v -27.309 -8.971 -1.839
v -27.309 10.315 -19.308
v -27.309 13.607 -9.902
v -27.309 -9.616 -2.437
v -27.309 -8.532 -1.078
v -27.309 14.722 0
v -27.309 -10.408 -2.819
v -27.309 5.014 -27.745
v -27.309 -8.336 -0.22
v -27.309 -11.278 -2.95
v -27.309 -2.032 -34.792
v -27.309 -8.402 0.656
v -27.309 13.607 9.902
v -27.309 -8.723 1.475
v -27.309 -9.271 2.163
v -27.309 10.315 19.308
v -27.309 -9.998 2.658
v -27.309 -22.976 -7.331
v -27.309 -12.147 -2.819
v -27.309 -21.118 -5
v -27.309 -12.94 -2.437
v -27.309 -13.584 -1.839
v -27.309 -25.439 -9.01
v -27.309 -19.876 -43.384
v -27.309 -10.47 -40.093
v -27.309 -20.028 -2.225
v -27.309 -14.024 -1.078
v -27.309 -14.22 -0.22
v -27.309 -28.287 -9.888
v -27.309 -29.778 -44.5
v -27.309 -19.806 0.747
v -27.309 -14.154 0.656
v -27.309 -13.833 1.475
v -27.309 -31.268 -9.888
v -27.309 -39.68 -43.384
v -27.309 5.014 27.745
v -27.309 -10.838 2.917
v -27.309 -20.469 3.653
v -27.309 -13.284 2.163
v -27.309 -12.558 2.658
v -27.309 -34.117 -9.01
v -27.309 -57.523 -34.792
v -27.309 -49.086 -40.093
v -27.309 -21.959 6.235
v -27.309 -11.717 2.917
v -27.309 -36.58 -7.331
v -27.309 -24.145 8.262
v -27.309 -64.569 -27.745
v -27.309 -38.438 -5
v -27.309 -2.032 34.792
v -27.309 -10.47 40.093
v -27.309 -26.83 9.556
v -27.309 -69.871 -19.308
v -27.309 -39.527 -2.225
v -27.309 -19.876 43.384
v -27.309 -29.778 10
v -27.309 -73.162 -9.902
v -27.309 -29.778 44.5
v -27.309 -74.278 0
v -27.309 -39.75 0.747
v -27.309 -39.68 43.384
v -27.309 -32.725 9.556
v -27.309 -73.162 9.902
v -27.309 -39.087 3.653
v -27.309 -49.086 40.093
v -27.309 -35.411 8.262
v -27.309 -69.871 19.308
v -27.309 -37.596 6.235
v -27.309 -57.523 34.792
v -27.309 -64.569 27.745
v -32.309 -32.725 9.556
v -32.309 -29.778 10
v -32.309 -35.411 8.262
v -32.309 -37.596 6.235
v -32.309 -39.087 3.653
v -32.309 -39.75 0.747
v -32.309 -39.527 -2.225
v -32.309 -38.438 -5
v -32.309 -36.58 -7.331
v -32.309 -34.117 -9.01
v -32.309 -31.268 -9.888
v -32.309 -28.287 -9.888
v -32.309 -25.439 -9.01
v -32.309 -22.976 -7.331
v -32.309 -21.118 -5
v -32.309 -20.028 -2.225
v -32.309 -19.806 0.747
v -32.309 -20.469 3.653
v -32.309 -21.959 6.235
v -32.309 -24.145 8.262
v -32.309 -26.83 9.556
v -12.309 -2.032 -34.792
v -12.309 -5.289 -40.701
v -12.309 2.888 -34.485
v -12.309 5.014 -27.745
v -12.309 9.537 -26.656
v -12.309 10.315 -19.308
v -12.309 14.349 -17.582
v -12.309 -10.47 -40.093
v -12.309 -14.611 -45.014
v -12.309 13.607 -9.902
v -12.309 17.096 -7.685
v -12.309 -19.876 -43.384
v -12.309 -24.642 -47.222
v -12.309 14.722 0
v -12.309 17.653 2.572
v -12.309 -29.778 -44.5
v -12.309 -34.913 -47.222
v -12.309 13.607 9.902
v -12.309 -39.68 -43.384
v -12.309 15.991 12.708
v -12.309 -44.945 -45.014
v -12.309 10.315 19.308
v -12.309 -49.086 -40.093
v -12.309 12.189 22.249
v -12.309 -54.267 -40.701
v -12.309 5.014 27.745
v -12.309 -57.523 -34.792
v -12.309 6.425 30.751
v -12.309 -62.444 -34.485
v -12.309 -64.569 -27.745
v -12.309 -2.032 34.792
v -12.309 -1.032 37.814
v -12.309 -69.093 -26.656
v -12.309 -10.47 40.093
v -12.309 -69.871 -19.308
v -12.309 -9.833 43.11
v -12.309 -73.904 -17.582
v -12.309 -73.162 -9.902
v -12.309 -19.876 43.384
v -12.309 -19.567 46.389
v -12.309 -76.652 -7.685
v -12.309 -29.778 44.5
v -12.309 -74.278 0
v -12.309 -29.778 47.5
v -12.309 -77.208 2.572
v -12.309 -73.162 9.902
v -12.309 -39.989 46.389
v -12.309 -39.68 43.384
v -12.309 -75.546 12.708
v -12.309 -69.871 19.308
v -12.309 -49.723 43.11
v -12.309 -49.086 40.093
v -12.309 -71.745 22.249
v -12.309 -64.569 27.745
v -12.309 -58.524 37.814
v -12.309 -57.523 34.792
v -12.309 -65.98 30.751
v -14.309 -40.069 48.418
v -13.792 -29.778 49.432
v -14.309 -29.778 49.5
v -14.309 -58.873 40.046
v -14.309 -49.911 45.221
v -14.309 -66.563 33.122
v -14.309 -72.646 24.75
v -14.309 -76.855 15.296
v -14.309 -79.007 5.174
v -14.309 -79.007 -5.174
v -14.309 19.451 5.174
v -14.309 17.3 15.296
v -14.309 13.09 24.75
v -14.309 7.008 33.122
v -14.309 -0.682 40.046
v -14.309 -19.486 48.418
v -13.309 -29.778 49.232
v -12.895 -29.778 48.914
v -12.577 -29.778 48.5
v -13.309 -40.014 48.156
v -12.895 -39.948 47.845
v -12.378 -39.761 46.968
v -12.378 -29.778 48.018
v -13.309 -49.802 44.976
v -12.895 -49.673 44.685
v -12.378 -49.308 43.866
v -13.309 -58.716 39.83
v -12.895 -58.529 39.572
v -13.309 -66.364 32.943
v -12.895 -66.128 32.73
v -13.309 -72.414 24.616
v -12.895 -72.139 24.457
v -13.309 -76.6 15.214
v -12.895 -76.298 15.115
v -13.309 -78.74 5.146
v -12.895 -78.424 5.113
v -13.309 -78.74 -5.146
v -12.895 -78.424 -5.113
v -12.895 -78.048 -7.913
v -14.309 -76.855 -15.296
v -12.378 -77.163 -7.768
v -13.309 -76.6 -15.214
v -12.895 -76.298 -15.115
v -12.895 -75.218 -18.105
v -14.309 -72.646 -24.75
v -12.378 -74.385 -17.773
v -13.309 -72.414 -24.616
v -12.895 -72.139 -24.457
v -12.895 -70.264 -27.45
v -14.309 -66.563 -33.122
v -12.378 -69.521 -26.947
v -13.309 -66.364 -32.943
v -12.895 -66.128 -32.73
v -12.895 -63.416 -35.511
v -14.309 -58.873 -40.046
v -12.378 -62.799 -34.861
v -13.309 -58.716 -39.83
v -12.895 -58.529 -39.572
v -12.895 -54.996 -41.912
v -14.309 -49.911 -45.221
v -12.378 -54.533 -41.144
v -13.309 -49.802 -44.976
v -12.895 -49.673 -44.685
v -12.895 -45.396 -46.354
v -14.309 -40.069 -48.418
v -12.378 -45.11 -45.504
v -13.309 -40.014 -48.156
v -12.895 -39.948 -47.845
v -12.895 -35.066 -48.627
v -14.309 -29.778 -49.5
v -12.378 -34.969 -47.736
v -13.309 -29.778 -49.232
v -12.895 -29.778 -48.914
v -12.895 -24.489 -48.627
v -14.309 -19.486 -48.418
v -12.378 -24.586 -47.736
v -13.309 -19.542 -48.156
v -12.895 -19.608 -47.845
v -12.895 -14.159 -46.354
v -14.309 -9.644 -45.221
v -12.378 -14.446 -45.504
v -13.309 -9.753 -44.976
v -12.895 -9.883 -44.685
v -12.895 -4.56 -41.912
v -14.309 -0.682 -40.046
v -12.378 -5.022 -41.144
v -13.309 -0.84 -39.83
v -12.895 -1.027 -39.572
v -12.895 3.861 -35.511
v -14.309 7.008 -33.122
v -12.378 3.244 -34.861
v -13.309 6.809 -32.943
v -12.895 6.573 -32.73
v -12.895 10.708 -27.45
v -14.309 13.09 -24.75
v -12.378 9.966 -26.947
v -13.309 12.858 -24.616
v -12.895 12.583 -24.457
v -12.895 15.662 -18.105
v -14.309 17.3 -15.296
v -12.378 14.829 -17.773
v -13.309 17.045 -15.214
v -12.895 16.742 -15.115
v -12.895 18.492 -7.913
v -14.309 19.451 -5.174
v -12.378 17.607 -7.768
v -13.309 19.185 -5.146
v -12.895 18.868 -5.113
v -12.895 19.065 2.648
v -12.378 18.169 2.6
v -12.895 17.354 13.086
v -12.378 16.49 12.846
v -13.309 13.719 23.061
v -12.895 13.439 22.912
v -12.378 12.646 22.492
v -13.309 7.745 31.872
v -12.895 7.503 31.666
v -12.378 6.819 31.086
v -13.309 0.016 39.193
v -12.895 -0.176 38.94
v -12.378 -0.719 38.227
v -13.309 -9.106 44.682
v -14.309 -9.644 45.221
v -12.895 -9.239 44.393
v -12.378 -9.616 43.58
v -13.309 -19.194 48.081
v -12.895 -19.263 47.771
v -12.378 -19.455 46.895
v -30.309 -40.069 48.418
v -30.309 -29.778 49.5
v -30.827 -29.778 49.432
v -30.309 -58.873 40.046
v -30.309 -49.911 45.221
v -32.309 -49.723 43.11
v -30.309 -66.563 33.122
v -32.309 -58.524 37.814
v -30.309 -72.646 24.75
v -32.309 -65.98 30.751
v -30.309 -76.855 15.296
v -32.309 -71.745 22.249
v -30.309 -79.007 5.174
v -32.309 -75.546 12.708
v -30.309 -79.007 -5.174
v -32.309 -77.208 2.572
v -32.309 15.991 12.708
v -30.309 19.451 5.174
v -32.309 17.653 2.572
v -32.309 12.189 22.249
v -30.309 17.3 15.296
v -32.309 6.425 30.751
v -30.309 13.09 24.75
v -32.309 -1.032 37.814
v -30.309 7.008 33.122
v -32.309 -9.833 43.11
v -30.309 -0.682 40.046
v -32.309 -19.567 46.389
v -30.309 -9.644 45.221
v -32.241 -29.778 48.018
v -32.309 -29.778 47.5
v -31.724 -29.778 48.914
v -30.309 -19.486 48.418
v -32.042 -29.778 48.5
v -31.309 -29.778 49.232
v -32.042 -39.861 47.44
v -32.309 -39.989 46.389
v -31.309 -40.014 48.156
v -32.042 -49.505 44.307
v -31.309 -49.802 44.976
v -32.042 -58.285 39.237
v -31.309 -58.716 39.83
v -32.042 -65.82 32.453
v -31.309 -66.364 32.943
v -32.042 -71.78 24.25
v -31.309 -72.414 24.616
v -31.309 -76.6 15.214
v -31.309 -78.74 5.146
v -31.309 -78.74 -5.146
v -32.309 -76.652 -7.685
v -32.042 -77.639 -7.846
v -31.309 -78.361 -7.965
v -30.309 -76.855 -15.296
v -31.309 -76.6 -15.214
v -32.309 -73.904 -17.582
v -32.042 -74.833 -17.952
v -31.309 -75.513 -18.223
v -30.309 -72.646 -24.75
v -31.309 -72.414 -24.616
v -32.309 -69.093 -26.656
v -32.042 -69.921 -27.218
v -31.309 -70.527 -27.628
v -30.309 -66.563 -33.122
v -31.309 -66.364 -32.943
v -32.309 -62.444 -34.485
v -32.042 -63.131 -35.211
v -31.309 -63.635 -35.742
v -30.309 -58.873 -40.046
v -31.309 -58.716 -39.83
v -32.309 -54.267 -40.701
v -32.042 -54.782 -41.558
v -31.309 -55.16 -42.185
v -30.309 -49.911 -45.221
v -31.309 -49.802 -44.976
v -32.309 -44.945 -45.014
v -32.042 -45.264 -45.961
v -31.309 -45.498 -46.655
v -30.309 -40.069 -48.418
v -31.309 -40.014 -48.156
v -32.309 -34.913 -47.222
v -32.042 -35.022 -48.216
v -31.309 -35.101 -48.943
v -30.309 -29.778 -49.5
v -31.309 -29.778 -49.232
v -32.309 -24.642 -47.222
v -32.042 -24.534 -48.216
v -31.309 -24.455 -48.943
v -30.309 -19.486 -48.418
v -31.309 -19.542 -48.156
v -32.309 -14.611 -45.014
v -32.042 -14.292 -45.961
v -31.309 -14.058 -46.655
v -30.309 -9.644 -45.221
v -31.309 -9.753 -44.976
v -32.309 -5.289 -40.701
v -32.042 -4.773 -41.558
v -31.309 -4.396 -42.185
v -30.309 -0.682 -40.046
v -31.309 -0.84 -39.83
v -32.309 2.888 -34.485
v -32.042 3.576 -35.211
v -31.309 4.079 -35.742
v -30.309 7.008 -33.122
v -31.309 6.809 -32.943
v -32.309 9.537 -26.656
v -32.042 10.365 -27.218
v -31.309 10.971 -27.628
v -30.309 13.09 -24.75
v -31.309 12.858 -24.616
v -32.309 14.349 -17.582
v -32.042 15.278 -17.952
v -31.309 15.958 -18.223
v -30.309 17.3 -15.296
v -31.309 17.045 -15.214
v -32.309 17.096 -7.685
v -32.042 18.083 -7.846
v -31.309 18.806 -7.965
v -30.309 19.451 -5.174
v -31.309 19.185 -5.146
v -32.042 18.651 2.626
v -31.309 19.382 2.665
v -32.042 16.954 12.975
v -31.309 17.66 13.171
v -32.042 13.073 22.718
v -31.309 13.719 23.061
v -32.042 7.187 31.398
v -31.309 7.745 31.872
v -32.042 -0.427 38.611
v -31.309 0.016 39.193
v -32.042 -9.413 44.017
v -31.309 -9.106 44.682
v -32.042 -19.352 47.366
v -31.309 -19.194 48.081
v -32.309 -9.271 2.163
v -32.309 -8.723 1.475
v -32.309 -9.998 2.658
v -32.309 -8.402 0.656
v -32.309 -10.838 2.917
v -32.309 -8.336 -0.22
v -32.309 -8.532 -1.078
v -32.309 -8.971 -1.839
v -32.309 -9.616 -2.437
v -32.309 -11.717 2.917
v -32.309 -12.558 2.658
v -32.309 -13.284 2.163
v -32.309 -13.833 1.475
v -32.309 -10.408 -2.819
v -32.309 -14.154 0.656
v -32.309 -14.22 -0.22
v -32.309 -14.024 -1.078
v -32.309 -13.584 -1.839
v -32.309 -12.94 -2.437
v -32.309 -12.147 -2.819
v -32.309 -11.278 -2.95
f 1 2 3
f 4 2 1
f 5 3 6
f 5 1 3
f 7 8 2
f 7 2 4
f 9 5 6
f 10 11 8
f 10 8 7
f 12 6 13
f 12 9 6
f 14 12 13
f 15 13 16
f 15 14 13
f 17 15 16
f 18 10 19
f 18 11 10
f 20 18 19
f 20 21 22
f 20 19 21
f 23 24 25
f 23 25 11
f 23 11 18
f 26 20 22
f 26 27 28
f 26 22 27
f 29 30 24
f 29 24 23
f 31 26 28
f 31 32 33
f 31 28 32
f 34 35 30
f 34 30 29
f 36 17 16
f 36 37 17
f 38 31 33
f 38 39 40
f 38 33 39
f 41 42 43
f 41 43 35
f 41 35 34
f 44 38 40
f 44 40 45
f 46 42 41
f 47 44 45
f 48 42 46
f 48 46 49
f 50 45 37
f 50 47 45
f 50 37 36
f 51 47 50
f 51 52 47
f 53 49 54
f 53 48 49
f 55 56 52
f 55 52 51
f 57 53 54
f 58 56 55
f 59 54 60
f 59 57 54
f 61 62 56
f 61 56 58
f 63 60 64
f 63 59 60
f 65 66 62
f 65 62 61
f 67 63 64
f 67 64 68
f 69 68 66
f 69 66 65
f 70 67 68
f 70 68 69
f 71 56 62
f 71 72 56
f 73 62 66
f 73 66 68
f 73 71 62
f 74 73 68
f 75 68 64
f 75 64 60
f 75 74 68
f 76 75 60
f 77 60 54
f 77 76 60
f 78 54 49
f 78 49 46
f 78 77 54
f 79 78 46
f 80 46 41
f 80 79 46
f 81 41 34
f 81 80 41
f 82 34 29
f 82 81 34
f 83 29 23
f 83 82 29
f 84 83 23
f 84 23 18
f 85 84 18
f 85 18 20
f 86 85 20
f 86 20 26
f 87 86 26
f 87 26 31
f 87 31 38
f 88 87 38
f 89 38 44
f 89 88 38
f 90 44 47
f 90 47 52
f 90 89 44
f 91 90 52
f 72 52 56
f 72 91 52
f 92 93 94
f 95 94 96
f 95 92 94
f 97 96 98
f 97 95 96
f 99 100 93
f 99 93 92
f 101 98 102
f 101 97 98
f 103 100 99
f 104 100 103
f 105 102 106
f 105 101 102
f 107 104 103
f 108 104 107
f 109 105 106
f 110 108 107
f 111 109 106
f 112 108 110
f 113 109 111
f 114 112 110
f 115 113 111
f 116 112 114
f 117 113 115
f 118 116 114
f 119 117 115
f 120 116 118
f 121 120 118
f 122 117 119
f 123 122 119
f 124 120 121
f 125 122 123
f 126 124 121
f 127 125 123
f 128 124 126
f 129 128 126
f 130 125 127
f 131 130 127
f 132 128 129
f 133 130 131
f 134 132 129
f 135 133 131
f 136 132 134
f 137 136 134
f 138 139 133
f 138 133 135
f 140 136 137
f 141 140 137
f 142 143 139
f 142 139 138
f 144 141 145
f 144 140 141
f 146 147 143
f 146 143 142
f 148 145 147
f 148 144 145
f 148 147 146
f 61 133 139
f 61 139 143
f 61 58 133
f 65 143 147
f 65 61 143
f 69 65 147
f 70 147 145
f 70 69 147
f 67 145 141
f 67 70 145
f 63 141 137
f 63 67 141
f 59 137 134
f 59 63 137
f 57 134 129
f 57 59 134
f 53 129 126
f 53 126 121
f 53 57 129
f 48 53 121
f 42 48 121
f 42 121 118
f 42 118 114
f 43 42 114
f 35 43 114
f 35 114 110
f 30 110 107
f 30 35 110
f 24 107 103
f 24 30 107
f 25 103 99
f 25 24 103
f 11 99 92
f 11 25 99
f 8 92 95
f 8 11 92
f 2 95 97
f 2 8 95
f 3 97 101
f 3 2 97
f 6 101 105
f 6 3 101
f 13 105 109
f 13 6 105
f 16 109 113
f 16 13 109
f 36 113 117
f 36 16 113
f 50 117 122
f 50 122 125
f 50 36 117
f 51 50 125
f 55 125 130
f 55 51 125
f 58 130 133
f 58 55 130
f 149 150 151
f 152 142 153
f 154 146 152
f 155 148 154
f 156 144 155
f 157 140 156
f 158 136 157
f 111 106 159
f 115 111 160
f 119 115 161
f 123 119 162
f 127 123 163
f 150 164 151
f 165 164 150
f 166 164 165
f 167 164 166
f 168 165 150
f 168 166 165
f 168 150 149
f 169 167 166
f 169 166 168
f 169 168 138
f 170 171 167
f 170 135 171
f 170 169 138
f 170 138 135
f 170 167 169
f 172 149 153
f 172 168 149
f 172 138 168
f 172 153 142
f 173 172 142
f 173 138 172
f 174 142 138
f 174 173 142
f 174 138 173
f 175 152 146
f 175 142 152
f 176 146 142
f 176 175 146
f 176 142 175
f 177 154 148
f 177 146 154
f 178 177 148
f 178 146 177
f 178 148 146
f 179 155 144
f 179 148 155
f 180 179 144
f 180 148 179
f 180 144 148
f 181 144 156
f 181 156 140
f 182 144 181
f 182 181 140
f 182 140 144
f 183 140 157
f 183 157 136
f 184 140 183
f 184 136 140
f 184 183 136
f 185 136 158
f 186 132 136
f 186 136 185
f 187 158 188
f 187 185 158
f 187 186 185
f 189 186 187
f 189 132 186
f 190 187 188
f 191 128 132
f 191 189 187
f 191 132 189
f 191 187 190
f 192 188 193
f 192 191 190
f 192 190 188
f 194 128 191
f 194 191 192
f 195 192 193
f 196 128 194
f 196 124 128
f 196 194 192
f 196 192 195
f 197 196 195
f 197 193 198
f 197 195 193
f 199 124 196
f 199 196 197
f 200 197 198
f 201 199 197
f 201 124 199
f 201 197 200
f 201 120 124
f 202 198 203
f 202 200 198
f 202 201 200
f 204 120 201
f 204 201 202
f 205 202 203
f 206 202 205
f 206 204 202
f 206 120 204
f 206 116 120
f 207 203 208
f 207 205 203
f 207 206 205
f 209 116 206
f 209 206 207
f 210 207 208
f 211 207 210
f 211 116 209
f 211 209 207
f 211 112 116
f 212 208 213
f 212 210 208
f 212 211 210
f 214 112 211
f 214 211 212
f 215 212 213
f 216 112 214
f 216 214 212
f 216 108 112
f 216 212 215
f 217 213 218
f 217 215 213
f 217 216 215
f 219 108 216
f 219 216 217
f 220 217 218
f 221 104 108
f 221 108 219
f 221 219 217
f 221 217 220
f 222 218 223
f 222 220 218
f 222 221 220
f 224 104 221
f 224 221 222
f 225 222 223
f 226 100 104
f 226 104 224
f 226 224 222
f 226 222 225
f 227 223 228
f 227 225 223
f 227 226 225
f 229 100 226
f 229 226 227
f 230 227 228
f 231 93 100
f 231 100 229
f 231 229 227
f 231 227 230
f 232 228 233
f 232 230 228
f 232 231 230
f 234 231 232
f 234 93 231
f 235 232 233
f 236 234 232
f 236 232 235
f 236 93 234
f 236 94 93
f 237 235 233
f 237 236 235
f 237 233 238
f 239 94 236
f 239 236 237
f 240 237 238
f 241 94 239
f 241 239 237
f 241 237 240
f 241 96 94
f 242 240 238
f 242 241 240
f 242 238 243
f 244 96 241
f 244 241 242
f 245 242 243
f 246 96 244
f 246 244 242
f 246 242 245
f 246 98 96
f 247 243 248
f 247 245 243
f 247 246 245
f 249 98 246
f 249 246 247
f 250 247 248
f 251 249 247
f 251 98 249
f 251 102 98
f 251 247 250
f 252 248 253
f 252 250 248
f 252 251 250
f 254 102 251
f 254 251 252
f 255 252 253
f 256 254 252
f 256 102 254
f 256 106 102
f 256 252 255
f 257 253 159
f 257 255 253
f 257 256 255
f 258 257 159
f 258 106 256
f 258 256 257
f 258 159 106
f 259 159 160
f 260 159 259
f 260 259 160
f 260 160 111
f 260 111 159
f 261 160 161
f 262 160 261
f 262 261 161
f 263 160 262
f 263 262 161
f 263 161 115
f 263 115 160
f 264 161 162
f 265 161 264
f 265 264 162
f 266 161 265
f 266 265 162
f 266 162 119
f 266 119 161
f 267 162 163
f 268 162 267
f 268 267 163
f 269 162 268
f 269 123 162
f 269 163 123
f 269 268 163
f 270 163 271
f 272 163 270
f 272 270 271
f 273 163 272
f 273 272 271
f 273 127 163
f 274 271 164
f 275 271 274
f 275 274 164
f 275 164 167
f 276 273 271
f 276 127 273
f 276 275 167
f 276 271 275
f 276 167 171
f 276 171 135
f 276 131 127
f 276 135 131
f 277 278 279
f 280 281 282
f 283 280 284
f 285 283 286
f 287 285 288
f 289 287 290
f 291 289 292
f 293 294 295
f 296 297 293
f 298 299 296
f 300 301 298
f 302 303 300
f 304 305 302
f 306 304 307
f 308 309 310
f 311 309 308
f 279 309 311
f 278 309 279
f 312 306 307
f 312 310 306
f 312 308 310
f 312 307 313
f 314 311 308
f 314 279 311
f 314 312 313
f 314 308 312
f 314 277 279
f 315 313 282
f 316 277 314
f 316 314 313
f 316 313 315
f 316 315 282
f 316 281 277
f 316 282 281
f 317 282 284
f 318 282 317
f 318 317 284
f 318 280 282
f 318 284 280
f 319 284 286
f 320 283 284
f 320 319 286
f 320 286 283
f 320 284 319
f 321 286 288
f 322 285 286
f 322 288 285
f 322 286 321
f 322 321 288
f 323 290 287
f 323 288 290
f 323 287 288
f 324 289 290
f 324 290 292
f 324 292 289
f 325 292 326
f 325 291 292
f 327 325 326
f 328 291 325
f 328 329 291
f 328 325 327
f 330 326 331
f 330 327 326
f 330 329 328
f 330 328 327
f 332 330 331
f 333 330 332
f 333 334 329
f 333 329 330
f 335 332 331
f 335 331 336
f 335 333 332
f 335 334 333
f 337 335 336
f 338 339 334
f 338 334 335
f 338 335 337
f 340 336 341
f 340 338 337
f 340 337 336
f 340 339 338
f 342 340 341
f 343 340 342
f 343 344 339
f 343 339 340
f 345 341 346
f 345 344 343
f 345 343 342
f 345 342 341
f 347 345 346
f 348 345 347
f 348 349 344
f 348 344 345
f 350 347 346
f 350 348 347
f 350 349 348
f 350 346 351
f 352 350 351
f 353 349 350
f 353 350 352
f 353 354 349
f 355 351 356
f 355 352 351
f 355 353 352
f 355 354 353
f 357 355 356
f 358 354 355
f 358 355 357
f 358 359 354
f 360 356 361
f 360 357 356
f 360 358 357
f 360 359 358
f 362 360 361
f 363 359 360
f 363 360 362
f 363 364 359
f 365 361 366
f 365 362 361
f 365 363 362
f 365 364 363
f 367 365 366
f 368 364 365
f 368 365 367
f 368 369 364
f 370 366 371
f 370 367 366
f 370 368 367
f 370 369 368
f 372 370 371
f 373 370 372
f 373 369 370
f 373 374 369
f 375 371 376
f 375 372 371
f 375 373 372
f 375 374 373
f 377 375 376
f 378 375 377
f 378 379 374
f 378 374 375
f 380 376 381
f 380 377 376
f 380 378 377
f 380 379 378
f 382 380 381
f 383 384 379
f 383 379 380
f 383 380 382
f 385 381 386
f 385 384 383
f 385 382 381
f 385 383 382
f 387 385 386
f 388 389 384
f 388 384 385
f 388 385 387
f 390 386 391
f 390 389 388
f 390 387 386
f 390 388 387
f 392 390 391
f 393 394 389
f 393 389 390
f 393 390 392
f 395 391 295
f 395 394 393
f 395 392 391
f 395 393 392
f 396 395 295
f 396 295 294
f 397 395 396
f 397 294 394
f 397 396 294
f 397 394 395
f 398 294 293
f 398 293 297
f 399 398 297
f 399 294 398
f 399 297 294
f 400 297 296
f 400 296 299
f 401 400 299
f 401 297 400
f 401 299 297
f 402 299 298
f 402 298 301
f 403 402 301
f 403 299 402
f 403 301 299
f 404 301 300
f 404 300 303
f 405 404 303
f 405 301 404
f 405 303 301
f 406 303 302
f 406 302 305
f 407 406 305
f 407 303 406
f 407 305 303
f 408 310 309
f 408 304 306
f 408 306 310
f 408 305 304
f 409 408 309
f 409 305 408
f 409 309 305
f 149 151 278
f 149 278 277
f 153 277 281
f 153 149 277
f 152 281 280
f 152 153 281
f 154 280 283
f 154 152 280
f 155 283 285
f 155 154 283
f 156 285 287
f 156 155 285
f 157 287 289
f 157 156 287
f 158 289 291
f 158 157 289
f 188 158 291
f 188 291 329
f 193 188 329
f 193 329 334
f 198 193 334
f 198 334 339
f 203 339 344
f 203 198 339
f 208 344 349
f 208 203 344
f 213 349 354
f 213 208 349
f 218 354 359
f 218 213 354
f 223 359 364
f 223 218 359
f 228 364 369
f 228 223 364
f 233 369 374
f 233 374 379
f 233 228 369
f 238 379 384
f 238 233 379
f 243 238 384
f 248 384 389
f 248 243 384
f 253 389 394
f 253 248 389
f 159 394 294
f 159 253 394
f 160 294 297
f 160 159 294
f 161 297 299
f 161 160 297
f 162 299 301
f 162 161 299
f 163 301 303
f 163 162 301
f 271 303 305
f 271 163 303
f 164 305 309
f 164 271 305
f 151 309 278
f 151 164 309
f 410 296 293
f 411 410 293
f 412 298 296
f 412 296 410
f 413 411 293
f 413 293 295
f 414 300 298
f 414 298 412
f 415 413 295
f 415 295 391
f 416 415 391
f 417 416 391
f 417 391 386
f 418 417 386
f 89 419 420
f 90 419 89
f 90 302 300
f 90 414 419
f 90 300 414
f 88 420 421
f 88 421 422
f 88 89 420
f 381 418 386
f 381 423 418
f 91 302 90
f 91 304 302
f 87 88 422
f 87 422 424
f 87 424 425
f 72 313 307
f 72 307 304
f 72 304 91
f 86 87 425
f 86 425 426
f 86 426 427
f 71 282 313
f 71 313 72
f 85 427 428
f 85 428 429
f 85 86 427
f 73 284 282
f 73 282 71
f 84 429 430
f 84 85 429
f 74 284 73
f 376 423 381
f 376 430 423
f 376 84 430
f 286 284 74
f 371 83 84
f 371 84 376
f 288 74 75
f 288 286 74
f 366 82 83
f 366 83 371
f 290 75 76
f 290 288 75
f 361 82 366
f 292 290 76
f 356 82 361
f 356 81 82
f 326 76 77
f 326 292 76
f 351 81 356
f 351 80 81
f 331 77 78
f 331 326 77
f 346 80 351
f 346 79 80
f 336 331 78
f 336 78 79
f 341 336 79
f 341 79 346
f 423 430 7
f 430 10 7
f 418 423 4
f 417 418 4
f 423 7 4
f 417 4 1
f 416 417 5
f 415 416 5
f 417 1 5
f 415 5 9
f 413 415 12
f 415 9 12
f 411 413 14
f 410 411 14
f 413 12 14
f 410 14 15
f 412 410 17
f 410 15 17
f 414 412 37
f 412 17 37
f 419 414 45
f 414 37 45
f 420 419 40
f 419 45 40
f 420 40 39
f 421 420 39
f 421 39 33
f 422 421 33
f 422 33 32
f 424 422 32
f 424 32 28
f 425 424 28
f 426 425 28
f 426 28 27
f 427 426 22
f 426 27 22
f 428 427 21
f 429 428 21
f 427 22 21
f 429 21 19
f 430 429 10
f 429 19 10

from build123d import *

# Parameters (mm, degrees)
FILLET2_R          = 2
FILLET3_R          = 2
SKETCH2_R          = 2.95
CUT_EXTRUDE1_DEPTH = 13


with BuildPart() as part:
    # Sketch1 → Revolve1 (revolve)
    with BuildSketch(Plane.XY, mode=Mode.PRIVATE) as revolve1_sk:
        Polygon((-12.309472934, 14.722222222), (-27.309472934, 14.722222222), (-27.309472934, -19.777777778), (-32.309472934, -19.777777778), (-32.309472934, 19.722222222), (-12.309472934, 19.722222222), align=None)
    revolve(revolve1_sk.sketch.rotate(Axis((-53.278814679, -29.777777778, 0), (1, 0, 0)), 90), axis=Axis((-53.278814679, -29.777777778, 0), (1, 0, 0)))

    # Fillet2
    fillet2_edges = [part.edges().sort_by_distance(p)[0] for p in [
        (-32.309472934, -29.777777778, -49.5),
    ]]
    fillet(fillet2_edges, radius=FILLET2_R)

    # Fillet3
    fillet3_edges = [part.edges().sort_by_distance(p)[0] for p in [
        (-12.309472934, -29.777777778, -49.5),
    ]]
    fillet(fillet3_edges, radius=FILLET3_R)

    # Sketch2 → Cut-Extrude1 (cut, symmetric)
    with BuildSketch(Plane(origin=(-27.309472934, 0, 0), x_dir=(0, 0, -1), z_dir=(1, 0, 0))):
        with Locations((0, -11.277777778)):
            Circle(SKETCH2_R)
    extrude(amount=CUT_EXTRUDE1_DEPTH, both=True, mode=Mode.SUBTRACT)


solid = part.part
